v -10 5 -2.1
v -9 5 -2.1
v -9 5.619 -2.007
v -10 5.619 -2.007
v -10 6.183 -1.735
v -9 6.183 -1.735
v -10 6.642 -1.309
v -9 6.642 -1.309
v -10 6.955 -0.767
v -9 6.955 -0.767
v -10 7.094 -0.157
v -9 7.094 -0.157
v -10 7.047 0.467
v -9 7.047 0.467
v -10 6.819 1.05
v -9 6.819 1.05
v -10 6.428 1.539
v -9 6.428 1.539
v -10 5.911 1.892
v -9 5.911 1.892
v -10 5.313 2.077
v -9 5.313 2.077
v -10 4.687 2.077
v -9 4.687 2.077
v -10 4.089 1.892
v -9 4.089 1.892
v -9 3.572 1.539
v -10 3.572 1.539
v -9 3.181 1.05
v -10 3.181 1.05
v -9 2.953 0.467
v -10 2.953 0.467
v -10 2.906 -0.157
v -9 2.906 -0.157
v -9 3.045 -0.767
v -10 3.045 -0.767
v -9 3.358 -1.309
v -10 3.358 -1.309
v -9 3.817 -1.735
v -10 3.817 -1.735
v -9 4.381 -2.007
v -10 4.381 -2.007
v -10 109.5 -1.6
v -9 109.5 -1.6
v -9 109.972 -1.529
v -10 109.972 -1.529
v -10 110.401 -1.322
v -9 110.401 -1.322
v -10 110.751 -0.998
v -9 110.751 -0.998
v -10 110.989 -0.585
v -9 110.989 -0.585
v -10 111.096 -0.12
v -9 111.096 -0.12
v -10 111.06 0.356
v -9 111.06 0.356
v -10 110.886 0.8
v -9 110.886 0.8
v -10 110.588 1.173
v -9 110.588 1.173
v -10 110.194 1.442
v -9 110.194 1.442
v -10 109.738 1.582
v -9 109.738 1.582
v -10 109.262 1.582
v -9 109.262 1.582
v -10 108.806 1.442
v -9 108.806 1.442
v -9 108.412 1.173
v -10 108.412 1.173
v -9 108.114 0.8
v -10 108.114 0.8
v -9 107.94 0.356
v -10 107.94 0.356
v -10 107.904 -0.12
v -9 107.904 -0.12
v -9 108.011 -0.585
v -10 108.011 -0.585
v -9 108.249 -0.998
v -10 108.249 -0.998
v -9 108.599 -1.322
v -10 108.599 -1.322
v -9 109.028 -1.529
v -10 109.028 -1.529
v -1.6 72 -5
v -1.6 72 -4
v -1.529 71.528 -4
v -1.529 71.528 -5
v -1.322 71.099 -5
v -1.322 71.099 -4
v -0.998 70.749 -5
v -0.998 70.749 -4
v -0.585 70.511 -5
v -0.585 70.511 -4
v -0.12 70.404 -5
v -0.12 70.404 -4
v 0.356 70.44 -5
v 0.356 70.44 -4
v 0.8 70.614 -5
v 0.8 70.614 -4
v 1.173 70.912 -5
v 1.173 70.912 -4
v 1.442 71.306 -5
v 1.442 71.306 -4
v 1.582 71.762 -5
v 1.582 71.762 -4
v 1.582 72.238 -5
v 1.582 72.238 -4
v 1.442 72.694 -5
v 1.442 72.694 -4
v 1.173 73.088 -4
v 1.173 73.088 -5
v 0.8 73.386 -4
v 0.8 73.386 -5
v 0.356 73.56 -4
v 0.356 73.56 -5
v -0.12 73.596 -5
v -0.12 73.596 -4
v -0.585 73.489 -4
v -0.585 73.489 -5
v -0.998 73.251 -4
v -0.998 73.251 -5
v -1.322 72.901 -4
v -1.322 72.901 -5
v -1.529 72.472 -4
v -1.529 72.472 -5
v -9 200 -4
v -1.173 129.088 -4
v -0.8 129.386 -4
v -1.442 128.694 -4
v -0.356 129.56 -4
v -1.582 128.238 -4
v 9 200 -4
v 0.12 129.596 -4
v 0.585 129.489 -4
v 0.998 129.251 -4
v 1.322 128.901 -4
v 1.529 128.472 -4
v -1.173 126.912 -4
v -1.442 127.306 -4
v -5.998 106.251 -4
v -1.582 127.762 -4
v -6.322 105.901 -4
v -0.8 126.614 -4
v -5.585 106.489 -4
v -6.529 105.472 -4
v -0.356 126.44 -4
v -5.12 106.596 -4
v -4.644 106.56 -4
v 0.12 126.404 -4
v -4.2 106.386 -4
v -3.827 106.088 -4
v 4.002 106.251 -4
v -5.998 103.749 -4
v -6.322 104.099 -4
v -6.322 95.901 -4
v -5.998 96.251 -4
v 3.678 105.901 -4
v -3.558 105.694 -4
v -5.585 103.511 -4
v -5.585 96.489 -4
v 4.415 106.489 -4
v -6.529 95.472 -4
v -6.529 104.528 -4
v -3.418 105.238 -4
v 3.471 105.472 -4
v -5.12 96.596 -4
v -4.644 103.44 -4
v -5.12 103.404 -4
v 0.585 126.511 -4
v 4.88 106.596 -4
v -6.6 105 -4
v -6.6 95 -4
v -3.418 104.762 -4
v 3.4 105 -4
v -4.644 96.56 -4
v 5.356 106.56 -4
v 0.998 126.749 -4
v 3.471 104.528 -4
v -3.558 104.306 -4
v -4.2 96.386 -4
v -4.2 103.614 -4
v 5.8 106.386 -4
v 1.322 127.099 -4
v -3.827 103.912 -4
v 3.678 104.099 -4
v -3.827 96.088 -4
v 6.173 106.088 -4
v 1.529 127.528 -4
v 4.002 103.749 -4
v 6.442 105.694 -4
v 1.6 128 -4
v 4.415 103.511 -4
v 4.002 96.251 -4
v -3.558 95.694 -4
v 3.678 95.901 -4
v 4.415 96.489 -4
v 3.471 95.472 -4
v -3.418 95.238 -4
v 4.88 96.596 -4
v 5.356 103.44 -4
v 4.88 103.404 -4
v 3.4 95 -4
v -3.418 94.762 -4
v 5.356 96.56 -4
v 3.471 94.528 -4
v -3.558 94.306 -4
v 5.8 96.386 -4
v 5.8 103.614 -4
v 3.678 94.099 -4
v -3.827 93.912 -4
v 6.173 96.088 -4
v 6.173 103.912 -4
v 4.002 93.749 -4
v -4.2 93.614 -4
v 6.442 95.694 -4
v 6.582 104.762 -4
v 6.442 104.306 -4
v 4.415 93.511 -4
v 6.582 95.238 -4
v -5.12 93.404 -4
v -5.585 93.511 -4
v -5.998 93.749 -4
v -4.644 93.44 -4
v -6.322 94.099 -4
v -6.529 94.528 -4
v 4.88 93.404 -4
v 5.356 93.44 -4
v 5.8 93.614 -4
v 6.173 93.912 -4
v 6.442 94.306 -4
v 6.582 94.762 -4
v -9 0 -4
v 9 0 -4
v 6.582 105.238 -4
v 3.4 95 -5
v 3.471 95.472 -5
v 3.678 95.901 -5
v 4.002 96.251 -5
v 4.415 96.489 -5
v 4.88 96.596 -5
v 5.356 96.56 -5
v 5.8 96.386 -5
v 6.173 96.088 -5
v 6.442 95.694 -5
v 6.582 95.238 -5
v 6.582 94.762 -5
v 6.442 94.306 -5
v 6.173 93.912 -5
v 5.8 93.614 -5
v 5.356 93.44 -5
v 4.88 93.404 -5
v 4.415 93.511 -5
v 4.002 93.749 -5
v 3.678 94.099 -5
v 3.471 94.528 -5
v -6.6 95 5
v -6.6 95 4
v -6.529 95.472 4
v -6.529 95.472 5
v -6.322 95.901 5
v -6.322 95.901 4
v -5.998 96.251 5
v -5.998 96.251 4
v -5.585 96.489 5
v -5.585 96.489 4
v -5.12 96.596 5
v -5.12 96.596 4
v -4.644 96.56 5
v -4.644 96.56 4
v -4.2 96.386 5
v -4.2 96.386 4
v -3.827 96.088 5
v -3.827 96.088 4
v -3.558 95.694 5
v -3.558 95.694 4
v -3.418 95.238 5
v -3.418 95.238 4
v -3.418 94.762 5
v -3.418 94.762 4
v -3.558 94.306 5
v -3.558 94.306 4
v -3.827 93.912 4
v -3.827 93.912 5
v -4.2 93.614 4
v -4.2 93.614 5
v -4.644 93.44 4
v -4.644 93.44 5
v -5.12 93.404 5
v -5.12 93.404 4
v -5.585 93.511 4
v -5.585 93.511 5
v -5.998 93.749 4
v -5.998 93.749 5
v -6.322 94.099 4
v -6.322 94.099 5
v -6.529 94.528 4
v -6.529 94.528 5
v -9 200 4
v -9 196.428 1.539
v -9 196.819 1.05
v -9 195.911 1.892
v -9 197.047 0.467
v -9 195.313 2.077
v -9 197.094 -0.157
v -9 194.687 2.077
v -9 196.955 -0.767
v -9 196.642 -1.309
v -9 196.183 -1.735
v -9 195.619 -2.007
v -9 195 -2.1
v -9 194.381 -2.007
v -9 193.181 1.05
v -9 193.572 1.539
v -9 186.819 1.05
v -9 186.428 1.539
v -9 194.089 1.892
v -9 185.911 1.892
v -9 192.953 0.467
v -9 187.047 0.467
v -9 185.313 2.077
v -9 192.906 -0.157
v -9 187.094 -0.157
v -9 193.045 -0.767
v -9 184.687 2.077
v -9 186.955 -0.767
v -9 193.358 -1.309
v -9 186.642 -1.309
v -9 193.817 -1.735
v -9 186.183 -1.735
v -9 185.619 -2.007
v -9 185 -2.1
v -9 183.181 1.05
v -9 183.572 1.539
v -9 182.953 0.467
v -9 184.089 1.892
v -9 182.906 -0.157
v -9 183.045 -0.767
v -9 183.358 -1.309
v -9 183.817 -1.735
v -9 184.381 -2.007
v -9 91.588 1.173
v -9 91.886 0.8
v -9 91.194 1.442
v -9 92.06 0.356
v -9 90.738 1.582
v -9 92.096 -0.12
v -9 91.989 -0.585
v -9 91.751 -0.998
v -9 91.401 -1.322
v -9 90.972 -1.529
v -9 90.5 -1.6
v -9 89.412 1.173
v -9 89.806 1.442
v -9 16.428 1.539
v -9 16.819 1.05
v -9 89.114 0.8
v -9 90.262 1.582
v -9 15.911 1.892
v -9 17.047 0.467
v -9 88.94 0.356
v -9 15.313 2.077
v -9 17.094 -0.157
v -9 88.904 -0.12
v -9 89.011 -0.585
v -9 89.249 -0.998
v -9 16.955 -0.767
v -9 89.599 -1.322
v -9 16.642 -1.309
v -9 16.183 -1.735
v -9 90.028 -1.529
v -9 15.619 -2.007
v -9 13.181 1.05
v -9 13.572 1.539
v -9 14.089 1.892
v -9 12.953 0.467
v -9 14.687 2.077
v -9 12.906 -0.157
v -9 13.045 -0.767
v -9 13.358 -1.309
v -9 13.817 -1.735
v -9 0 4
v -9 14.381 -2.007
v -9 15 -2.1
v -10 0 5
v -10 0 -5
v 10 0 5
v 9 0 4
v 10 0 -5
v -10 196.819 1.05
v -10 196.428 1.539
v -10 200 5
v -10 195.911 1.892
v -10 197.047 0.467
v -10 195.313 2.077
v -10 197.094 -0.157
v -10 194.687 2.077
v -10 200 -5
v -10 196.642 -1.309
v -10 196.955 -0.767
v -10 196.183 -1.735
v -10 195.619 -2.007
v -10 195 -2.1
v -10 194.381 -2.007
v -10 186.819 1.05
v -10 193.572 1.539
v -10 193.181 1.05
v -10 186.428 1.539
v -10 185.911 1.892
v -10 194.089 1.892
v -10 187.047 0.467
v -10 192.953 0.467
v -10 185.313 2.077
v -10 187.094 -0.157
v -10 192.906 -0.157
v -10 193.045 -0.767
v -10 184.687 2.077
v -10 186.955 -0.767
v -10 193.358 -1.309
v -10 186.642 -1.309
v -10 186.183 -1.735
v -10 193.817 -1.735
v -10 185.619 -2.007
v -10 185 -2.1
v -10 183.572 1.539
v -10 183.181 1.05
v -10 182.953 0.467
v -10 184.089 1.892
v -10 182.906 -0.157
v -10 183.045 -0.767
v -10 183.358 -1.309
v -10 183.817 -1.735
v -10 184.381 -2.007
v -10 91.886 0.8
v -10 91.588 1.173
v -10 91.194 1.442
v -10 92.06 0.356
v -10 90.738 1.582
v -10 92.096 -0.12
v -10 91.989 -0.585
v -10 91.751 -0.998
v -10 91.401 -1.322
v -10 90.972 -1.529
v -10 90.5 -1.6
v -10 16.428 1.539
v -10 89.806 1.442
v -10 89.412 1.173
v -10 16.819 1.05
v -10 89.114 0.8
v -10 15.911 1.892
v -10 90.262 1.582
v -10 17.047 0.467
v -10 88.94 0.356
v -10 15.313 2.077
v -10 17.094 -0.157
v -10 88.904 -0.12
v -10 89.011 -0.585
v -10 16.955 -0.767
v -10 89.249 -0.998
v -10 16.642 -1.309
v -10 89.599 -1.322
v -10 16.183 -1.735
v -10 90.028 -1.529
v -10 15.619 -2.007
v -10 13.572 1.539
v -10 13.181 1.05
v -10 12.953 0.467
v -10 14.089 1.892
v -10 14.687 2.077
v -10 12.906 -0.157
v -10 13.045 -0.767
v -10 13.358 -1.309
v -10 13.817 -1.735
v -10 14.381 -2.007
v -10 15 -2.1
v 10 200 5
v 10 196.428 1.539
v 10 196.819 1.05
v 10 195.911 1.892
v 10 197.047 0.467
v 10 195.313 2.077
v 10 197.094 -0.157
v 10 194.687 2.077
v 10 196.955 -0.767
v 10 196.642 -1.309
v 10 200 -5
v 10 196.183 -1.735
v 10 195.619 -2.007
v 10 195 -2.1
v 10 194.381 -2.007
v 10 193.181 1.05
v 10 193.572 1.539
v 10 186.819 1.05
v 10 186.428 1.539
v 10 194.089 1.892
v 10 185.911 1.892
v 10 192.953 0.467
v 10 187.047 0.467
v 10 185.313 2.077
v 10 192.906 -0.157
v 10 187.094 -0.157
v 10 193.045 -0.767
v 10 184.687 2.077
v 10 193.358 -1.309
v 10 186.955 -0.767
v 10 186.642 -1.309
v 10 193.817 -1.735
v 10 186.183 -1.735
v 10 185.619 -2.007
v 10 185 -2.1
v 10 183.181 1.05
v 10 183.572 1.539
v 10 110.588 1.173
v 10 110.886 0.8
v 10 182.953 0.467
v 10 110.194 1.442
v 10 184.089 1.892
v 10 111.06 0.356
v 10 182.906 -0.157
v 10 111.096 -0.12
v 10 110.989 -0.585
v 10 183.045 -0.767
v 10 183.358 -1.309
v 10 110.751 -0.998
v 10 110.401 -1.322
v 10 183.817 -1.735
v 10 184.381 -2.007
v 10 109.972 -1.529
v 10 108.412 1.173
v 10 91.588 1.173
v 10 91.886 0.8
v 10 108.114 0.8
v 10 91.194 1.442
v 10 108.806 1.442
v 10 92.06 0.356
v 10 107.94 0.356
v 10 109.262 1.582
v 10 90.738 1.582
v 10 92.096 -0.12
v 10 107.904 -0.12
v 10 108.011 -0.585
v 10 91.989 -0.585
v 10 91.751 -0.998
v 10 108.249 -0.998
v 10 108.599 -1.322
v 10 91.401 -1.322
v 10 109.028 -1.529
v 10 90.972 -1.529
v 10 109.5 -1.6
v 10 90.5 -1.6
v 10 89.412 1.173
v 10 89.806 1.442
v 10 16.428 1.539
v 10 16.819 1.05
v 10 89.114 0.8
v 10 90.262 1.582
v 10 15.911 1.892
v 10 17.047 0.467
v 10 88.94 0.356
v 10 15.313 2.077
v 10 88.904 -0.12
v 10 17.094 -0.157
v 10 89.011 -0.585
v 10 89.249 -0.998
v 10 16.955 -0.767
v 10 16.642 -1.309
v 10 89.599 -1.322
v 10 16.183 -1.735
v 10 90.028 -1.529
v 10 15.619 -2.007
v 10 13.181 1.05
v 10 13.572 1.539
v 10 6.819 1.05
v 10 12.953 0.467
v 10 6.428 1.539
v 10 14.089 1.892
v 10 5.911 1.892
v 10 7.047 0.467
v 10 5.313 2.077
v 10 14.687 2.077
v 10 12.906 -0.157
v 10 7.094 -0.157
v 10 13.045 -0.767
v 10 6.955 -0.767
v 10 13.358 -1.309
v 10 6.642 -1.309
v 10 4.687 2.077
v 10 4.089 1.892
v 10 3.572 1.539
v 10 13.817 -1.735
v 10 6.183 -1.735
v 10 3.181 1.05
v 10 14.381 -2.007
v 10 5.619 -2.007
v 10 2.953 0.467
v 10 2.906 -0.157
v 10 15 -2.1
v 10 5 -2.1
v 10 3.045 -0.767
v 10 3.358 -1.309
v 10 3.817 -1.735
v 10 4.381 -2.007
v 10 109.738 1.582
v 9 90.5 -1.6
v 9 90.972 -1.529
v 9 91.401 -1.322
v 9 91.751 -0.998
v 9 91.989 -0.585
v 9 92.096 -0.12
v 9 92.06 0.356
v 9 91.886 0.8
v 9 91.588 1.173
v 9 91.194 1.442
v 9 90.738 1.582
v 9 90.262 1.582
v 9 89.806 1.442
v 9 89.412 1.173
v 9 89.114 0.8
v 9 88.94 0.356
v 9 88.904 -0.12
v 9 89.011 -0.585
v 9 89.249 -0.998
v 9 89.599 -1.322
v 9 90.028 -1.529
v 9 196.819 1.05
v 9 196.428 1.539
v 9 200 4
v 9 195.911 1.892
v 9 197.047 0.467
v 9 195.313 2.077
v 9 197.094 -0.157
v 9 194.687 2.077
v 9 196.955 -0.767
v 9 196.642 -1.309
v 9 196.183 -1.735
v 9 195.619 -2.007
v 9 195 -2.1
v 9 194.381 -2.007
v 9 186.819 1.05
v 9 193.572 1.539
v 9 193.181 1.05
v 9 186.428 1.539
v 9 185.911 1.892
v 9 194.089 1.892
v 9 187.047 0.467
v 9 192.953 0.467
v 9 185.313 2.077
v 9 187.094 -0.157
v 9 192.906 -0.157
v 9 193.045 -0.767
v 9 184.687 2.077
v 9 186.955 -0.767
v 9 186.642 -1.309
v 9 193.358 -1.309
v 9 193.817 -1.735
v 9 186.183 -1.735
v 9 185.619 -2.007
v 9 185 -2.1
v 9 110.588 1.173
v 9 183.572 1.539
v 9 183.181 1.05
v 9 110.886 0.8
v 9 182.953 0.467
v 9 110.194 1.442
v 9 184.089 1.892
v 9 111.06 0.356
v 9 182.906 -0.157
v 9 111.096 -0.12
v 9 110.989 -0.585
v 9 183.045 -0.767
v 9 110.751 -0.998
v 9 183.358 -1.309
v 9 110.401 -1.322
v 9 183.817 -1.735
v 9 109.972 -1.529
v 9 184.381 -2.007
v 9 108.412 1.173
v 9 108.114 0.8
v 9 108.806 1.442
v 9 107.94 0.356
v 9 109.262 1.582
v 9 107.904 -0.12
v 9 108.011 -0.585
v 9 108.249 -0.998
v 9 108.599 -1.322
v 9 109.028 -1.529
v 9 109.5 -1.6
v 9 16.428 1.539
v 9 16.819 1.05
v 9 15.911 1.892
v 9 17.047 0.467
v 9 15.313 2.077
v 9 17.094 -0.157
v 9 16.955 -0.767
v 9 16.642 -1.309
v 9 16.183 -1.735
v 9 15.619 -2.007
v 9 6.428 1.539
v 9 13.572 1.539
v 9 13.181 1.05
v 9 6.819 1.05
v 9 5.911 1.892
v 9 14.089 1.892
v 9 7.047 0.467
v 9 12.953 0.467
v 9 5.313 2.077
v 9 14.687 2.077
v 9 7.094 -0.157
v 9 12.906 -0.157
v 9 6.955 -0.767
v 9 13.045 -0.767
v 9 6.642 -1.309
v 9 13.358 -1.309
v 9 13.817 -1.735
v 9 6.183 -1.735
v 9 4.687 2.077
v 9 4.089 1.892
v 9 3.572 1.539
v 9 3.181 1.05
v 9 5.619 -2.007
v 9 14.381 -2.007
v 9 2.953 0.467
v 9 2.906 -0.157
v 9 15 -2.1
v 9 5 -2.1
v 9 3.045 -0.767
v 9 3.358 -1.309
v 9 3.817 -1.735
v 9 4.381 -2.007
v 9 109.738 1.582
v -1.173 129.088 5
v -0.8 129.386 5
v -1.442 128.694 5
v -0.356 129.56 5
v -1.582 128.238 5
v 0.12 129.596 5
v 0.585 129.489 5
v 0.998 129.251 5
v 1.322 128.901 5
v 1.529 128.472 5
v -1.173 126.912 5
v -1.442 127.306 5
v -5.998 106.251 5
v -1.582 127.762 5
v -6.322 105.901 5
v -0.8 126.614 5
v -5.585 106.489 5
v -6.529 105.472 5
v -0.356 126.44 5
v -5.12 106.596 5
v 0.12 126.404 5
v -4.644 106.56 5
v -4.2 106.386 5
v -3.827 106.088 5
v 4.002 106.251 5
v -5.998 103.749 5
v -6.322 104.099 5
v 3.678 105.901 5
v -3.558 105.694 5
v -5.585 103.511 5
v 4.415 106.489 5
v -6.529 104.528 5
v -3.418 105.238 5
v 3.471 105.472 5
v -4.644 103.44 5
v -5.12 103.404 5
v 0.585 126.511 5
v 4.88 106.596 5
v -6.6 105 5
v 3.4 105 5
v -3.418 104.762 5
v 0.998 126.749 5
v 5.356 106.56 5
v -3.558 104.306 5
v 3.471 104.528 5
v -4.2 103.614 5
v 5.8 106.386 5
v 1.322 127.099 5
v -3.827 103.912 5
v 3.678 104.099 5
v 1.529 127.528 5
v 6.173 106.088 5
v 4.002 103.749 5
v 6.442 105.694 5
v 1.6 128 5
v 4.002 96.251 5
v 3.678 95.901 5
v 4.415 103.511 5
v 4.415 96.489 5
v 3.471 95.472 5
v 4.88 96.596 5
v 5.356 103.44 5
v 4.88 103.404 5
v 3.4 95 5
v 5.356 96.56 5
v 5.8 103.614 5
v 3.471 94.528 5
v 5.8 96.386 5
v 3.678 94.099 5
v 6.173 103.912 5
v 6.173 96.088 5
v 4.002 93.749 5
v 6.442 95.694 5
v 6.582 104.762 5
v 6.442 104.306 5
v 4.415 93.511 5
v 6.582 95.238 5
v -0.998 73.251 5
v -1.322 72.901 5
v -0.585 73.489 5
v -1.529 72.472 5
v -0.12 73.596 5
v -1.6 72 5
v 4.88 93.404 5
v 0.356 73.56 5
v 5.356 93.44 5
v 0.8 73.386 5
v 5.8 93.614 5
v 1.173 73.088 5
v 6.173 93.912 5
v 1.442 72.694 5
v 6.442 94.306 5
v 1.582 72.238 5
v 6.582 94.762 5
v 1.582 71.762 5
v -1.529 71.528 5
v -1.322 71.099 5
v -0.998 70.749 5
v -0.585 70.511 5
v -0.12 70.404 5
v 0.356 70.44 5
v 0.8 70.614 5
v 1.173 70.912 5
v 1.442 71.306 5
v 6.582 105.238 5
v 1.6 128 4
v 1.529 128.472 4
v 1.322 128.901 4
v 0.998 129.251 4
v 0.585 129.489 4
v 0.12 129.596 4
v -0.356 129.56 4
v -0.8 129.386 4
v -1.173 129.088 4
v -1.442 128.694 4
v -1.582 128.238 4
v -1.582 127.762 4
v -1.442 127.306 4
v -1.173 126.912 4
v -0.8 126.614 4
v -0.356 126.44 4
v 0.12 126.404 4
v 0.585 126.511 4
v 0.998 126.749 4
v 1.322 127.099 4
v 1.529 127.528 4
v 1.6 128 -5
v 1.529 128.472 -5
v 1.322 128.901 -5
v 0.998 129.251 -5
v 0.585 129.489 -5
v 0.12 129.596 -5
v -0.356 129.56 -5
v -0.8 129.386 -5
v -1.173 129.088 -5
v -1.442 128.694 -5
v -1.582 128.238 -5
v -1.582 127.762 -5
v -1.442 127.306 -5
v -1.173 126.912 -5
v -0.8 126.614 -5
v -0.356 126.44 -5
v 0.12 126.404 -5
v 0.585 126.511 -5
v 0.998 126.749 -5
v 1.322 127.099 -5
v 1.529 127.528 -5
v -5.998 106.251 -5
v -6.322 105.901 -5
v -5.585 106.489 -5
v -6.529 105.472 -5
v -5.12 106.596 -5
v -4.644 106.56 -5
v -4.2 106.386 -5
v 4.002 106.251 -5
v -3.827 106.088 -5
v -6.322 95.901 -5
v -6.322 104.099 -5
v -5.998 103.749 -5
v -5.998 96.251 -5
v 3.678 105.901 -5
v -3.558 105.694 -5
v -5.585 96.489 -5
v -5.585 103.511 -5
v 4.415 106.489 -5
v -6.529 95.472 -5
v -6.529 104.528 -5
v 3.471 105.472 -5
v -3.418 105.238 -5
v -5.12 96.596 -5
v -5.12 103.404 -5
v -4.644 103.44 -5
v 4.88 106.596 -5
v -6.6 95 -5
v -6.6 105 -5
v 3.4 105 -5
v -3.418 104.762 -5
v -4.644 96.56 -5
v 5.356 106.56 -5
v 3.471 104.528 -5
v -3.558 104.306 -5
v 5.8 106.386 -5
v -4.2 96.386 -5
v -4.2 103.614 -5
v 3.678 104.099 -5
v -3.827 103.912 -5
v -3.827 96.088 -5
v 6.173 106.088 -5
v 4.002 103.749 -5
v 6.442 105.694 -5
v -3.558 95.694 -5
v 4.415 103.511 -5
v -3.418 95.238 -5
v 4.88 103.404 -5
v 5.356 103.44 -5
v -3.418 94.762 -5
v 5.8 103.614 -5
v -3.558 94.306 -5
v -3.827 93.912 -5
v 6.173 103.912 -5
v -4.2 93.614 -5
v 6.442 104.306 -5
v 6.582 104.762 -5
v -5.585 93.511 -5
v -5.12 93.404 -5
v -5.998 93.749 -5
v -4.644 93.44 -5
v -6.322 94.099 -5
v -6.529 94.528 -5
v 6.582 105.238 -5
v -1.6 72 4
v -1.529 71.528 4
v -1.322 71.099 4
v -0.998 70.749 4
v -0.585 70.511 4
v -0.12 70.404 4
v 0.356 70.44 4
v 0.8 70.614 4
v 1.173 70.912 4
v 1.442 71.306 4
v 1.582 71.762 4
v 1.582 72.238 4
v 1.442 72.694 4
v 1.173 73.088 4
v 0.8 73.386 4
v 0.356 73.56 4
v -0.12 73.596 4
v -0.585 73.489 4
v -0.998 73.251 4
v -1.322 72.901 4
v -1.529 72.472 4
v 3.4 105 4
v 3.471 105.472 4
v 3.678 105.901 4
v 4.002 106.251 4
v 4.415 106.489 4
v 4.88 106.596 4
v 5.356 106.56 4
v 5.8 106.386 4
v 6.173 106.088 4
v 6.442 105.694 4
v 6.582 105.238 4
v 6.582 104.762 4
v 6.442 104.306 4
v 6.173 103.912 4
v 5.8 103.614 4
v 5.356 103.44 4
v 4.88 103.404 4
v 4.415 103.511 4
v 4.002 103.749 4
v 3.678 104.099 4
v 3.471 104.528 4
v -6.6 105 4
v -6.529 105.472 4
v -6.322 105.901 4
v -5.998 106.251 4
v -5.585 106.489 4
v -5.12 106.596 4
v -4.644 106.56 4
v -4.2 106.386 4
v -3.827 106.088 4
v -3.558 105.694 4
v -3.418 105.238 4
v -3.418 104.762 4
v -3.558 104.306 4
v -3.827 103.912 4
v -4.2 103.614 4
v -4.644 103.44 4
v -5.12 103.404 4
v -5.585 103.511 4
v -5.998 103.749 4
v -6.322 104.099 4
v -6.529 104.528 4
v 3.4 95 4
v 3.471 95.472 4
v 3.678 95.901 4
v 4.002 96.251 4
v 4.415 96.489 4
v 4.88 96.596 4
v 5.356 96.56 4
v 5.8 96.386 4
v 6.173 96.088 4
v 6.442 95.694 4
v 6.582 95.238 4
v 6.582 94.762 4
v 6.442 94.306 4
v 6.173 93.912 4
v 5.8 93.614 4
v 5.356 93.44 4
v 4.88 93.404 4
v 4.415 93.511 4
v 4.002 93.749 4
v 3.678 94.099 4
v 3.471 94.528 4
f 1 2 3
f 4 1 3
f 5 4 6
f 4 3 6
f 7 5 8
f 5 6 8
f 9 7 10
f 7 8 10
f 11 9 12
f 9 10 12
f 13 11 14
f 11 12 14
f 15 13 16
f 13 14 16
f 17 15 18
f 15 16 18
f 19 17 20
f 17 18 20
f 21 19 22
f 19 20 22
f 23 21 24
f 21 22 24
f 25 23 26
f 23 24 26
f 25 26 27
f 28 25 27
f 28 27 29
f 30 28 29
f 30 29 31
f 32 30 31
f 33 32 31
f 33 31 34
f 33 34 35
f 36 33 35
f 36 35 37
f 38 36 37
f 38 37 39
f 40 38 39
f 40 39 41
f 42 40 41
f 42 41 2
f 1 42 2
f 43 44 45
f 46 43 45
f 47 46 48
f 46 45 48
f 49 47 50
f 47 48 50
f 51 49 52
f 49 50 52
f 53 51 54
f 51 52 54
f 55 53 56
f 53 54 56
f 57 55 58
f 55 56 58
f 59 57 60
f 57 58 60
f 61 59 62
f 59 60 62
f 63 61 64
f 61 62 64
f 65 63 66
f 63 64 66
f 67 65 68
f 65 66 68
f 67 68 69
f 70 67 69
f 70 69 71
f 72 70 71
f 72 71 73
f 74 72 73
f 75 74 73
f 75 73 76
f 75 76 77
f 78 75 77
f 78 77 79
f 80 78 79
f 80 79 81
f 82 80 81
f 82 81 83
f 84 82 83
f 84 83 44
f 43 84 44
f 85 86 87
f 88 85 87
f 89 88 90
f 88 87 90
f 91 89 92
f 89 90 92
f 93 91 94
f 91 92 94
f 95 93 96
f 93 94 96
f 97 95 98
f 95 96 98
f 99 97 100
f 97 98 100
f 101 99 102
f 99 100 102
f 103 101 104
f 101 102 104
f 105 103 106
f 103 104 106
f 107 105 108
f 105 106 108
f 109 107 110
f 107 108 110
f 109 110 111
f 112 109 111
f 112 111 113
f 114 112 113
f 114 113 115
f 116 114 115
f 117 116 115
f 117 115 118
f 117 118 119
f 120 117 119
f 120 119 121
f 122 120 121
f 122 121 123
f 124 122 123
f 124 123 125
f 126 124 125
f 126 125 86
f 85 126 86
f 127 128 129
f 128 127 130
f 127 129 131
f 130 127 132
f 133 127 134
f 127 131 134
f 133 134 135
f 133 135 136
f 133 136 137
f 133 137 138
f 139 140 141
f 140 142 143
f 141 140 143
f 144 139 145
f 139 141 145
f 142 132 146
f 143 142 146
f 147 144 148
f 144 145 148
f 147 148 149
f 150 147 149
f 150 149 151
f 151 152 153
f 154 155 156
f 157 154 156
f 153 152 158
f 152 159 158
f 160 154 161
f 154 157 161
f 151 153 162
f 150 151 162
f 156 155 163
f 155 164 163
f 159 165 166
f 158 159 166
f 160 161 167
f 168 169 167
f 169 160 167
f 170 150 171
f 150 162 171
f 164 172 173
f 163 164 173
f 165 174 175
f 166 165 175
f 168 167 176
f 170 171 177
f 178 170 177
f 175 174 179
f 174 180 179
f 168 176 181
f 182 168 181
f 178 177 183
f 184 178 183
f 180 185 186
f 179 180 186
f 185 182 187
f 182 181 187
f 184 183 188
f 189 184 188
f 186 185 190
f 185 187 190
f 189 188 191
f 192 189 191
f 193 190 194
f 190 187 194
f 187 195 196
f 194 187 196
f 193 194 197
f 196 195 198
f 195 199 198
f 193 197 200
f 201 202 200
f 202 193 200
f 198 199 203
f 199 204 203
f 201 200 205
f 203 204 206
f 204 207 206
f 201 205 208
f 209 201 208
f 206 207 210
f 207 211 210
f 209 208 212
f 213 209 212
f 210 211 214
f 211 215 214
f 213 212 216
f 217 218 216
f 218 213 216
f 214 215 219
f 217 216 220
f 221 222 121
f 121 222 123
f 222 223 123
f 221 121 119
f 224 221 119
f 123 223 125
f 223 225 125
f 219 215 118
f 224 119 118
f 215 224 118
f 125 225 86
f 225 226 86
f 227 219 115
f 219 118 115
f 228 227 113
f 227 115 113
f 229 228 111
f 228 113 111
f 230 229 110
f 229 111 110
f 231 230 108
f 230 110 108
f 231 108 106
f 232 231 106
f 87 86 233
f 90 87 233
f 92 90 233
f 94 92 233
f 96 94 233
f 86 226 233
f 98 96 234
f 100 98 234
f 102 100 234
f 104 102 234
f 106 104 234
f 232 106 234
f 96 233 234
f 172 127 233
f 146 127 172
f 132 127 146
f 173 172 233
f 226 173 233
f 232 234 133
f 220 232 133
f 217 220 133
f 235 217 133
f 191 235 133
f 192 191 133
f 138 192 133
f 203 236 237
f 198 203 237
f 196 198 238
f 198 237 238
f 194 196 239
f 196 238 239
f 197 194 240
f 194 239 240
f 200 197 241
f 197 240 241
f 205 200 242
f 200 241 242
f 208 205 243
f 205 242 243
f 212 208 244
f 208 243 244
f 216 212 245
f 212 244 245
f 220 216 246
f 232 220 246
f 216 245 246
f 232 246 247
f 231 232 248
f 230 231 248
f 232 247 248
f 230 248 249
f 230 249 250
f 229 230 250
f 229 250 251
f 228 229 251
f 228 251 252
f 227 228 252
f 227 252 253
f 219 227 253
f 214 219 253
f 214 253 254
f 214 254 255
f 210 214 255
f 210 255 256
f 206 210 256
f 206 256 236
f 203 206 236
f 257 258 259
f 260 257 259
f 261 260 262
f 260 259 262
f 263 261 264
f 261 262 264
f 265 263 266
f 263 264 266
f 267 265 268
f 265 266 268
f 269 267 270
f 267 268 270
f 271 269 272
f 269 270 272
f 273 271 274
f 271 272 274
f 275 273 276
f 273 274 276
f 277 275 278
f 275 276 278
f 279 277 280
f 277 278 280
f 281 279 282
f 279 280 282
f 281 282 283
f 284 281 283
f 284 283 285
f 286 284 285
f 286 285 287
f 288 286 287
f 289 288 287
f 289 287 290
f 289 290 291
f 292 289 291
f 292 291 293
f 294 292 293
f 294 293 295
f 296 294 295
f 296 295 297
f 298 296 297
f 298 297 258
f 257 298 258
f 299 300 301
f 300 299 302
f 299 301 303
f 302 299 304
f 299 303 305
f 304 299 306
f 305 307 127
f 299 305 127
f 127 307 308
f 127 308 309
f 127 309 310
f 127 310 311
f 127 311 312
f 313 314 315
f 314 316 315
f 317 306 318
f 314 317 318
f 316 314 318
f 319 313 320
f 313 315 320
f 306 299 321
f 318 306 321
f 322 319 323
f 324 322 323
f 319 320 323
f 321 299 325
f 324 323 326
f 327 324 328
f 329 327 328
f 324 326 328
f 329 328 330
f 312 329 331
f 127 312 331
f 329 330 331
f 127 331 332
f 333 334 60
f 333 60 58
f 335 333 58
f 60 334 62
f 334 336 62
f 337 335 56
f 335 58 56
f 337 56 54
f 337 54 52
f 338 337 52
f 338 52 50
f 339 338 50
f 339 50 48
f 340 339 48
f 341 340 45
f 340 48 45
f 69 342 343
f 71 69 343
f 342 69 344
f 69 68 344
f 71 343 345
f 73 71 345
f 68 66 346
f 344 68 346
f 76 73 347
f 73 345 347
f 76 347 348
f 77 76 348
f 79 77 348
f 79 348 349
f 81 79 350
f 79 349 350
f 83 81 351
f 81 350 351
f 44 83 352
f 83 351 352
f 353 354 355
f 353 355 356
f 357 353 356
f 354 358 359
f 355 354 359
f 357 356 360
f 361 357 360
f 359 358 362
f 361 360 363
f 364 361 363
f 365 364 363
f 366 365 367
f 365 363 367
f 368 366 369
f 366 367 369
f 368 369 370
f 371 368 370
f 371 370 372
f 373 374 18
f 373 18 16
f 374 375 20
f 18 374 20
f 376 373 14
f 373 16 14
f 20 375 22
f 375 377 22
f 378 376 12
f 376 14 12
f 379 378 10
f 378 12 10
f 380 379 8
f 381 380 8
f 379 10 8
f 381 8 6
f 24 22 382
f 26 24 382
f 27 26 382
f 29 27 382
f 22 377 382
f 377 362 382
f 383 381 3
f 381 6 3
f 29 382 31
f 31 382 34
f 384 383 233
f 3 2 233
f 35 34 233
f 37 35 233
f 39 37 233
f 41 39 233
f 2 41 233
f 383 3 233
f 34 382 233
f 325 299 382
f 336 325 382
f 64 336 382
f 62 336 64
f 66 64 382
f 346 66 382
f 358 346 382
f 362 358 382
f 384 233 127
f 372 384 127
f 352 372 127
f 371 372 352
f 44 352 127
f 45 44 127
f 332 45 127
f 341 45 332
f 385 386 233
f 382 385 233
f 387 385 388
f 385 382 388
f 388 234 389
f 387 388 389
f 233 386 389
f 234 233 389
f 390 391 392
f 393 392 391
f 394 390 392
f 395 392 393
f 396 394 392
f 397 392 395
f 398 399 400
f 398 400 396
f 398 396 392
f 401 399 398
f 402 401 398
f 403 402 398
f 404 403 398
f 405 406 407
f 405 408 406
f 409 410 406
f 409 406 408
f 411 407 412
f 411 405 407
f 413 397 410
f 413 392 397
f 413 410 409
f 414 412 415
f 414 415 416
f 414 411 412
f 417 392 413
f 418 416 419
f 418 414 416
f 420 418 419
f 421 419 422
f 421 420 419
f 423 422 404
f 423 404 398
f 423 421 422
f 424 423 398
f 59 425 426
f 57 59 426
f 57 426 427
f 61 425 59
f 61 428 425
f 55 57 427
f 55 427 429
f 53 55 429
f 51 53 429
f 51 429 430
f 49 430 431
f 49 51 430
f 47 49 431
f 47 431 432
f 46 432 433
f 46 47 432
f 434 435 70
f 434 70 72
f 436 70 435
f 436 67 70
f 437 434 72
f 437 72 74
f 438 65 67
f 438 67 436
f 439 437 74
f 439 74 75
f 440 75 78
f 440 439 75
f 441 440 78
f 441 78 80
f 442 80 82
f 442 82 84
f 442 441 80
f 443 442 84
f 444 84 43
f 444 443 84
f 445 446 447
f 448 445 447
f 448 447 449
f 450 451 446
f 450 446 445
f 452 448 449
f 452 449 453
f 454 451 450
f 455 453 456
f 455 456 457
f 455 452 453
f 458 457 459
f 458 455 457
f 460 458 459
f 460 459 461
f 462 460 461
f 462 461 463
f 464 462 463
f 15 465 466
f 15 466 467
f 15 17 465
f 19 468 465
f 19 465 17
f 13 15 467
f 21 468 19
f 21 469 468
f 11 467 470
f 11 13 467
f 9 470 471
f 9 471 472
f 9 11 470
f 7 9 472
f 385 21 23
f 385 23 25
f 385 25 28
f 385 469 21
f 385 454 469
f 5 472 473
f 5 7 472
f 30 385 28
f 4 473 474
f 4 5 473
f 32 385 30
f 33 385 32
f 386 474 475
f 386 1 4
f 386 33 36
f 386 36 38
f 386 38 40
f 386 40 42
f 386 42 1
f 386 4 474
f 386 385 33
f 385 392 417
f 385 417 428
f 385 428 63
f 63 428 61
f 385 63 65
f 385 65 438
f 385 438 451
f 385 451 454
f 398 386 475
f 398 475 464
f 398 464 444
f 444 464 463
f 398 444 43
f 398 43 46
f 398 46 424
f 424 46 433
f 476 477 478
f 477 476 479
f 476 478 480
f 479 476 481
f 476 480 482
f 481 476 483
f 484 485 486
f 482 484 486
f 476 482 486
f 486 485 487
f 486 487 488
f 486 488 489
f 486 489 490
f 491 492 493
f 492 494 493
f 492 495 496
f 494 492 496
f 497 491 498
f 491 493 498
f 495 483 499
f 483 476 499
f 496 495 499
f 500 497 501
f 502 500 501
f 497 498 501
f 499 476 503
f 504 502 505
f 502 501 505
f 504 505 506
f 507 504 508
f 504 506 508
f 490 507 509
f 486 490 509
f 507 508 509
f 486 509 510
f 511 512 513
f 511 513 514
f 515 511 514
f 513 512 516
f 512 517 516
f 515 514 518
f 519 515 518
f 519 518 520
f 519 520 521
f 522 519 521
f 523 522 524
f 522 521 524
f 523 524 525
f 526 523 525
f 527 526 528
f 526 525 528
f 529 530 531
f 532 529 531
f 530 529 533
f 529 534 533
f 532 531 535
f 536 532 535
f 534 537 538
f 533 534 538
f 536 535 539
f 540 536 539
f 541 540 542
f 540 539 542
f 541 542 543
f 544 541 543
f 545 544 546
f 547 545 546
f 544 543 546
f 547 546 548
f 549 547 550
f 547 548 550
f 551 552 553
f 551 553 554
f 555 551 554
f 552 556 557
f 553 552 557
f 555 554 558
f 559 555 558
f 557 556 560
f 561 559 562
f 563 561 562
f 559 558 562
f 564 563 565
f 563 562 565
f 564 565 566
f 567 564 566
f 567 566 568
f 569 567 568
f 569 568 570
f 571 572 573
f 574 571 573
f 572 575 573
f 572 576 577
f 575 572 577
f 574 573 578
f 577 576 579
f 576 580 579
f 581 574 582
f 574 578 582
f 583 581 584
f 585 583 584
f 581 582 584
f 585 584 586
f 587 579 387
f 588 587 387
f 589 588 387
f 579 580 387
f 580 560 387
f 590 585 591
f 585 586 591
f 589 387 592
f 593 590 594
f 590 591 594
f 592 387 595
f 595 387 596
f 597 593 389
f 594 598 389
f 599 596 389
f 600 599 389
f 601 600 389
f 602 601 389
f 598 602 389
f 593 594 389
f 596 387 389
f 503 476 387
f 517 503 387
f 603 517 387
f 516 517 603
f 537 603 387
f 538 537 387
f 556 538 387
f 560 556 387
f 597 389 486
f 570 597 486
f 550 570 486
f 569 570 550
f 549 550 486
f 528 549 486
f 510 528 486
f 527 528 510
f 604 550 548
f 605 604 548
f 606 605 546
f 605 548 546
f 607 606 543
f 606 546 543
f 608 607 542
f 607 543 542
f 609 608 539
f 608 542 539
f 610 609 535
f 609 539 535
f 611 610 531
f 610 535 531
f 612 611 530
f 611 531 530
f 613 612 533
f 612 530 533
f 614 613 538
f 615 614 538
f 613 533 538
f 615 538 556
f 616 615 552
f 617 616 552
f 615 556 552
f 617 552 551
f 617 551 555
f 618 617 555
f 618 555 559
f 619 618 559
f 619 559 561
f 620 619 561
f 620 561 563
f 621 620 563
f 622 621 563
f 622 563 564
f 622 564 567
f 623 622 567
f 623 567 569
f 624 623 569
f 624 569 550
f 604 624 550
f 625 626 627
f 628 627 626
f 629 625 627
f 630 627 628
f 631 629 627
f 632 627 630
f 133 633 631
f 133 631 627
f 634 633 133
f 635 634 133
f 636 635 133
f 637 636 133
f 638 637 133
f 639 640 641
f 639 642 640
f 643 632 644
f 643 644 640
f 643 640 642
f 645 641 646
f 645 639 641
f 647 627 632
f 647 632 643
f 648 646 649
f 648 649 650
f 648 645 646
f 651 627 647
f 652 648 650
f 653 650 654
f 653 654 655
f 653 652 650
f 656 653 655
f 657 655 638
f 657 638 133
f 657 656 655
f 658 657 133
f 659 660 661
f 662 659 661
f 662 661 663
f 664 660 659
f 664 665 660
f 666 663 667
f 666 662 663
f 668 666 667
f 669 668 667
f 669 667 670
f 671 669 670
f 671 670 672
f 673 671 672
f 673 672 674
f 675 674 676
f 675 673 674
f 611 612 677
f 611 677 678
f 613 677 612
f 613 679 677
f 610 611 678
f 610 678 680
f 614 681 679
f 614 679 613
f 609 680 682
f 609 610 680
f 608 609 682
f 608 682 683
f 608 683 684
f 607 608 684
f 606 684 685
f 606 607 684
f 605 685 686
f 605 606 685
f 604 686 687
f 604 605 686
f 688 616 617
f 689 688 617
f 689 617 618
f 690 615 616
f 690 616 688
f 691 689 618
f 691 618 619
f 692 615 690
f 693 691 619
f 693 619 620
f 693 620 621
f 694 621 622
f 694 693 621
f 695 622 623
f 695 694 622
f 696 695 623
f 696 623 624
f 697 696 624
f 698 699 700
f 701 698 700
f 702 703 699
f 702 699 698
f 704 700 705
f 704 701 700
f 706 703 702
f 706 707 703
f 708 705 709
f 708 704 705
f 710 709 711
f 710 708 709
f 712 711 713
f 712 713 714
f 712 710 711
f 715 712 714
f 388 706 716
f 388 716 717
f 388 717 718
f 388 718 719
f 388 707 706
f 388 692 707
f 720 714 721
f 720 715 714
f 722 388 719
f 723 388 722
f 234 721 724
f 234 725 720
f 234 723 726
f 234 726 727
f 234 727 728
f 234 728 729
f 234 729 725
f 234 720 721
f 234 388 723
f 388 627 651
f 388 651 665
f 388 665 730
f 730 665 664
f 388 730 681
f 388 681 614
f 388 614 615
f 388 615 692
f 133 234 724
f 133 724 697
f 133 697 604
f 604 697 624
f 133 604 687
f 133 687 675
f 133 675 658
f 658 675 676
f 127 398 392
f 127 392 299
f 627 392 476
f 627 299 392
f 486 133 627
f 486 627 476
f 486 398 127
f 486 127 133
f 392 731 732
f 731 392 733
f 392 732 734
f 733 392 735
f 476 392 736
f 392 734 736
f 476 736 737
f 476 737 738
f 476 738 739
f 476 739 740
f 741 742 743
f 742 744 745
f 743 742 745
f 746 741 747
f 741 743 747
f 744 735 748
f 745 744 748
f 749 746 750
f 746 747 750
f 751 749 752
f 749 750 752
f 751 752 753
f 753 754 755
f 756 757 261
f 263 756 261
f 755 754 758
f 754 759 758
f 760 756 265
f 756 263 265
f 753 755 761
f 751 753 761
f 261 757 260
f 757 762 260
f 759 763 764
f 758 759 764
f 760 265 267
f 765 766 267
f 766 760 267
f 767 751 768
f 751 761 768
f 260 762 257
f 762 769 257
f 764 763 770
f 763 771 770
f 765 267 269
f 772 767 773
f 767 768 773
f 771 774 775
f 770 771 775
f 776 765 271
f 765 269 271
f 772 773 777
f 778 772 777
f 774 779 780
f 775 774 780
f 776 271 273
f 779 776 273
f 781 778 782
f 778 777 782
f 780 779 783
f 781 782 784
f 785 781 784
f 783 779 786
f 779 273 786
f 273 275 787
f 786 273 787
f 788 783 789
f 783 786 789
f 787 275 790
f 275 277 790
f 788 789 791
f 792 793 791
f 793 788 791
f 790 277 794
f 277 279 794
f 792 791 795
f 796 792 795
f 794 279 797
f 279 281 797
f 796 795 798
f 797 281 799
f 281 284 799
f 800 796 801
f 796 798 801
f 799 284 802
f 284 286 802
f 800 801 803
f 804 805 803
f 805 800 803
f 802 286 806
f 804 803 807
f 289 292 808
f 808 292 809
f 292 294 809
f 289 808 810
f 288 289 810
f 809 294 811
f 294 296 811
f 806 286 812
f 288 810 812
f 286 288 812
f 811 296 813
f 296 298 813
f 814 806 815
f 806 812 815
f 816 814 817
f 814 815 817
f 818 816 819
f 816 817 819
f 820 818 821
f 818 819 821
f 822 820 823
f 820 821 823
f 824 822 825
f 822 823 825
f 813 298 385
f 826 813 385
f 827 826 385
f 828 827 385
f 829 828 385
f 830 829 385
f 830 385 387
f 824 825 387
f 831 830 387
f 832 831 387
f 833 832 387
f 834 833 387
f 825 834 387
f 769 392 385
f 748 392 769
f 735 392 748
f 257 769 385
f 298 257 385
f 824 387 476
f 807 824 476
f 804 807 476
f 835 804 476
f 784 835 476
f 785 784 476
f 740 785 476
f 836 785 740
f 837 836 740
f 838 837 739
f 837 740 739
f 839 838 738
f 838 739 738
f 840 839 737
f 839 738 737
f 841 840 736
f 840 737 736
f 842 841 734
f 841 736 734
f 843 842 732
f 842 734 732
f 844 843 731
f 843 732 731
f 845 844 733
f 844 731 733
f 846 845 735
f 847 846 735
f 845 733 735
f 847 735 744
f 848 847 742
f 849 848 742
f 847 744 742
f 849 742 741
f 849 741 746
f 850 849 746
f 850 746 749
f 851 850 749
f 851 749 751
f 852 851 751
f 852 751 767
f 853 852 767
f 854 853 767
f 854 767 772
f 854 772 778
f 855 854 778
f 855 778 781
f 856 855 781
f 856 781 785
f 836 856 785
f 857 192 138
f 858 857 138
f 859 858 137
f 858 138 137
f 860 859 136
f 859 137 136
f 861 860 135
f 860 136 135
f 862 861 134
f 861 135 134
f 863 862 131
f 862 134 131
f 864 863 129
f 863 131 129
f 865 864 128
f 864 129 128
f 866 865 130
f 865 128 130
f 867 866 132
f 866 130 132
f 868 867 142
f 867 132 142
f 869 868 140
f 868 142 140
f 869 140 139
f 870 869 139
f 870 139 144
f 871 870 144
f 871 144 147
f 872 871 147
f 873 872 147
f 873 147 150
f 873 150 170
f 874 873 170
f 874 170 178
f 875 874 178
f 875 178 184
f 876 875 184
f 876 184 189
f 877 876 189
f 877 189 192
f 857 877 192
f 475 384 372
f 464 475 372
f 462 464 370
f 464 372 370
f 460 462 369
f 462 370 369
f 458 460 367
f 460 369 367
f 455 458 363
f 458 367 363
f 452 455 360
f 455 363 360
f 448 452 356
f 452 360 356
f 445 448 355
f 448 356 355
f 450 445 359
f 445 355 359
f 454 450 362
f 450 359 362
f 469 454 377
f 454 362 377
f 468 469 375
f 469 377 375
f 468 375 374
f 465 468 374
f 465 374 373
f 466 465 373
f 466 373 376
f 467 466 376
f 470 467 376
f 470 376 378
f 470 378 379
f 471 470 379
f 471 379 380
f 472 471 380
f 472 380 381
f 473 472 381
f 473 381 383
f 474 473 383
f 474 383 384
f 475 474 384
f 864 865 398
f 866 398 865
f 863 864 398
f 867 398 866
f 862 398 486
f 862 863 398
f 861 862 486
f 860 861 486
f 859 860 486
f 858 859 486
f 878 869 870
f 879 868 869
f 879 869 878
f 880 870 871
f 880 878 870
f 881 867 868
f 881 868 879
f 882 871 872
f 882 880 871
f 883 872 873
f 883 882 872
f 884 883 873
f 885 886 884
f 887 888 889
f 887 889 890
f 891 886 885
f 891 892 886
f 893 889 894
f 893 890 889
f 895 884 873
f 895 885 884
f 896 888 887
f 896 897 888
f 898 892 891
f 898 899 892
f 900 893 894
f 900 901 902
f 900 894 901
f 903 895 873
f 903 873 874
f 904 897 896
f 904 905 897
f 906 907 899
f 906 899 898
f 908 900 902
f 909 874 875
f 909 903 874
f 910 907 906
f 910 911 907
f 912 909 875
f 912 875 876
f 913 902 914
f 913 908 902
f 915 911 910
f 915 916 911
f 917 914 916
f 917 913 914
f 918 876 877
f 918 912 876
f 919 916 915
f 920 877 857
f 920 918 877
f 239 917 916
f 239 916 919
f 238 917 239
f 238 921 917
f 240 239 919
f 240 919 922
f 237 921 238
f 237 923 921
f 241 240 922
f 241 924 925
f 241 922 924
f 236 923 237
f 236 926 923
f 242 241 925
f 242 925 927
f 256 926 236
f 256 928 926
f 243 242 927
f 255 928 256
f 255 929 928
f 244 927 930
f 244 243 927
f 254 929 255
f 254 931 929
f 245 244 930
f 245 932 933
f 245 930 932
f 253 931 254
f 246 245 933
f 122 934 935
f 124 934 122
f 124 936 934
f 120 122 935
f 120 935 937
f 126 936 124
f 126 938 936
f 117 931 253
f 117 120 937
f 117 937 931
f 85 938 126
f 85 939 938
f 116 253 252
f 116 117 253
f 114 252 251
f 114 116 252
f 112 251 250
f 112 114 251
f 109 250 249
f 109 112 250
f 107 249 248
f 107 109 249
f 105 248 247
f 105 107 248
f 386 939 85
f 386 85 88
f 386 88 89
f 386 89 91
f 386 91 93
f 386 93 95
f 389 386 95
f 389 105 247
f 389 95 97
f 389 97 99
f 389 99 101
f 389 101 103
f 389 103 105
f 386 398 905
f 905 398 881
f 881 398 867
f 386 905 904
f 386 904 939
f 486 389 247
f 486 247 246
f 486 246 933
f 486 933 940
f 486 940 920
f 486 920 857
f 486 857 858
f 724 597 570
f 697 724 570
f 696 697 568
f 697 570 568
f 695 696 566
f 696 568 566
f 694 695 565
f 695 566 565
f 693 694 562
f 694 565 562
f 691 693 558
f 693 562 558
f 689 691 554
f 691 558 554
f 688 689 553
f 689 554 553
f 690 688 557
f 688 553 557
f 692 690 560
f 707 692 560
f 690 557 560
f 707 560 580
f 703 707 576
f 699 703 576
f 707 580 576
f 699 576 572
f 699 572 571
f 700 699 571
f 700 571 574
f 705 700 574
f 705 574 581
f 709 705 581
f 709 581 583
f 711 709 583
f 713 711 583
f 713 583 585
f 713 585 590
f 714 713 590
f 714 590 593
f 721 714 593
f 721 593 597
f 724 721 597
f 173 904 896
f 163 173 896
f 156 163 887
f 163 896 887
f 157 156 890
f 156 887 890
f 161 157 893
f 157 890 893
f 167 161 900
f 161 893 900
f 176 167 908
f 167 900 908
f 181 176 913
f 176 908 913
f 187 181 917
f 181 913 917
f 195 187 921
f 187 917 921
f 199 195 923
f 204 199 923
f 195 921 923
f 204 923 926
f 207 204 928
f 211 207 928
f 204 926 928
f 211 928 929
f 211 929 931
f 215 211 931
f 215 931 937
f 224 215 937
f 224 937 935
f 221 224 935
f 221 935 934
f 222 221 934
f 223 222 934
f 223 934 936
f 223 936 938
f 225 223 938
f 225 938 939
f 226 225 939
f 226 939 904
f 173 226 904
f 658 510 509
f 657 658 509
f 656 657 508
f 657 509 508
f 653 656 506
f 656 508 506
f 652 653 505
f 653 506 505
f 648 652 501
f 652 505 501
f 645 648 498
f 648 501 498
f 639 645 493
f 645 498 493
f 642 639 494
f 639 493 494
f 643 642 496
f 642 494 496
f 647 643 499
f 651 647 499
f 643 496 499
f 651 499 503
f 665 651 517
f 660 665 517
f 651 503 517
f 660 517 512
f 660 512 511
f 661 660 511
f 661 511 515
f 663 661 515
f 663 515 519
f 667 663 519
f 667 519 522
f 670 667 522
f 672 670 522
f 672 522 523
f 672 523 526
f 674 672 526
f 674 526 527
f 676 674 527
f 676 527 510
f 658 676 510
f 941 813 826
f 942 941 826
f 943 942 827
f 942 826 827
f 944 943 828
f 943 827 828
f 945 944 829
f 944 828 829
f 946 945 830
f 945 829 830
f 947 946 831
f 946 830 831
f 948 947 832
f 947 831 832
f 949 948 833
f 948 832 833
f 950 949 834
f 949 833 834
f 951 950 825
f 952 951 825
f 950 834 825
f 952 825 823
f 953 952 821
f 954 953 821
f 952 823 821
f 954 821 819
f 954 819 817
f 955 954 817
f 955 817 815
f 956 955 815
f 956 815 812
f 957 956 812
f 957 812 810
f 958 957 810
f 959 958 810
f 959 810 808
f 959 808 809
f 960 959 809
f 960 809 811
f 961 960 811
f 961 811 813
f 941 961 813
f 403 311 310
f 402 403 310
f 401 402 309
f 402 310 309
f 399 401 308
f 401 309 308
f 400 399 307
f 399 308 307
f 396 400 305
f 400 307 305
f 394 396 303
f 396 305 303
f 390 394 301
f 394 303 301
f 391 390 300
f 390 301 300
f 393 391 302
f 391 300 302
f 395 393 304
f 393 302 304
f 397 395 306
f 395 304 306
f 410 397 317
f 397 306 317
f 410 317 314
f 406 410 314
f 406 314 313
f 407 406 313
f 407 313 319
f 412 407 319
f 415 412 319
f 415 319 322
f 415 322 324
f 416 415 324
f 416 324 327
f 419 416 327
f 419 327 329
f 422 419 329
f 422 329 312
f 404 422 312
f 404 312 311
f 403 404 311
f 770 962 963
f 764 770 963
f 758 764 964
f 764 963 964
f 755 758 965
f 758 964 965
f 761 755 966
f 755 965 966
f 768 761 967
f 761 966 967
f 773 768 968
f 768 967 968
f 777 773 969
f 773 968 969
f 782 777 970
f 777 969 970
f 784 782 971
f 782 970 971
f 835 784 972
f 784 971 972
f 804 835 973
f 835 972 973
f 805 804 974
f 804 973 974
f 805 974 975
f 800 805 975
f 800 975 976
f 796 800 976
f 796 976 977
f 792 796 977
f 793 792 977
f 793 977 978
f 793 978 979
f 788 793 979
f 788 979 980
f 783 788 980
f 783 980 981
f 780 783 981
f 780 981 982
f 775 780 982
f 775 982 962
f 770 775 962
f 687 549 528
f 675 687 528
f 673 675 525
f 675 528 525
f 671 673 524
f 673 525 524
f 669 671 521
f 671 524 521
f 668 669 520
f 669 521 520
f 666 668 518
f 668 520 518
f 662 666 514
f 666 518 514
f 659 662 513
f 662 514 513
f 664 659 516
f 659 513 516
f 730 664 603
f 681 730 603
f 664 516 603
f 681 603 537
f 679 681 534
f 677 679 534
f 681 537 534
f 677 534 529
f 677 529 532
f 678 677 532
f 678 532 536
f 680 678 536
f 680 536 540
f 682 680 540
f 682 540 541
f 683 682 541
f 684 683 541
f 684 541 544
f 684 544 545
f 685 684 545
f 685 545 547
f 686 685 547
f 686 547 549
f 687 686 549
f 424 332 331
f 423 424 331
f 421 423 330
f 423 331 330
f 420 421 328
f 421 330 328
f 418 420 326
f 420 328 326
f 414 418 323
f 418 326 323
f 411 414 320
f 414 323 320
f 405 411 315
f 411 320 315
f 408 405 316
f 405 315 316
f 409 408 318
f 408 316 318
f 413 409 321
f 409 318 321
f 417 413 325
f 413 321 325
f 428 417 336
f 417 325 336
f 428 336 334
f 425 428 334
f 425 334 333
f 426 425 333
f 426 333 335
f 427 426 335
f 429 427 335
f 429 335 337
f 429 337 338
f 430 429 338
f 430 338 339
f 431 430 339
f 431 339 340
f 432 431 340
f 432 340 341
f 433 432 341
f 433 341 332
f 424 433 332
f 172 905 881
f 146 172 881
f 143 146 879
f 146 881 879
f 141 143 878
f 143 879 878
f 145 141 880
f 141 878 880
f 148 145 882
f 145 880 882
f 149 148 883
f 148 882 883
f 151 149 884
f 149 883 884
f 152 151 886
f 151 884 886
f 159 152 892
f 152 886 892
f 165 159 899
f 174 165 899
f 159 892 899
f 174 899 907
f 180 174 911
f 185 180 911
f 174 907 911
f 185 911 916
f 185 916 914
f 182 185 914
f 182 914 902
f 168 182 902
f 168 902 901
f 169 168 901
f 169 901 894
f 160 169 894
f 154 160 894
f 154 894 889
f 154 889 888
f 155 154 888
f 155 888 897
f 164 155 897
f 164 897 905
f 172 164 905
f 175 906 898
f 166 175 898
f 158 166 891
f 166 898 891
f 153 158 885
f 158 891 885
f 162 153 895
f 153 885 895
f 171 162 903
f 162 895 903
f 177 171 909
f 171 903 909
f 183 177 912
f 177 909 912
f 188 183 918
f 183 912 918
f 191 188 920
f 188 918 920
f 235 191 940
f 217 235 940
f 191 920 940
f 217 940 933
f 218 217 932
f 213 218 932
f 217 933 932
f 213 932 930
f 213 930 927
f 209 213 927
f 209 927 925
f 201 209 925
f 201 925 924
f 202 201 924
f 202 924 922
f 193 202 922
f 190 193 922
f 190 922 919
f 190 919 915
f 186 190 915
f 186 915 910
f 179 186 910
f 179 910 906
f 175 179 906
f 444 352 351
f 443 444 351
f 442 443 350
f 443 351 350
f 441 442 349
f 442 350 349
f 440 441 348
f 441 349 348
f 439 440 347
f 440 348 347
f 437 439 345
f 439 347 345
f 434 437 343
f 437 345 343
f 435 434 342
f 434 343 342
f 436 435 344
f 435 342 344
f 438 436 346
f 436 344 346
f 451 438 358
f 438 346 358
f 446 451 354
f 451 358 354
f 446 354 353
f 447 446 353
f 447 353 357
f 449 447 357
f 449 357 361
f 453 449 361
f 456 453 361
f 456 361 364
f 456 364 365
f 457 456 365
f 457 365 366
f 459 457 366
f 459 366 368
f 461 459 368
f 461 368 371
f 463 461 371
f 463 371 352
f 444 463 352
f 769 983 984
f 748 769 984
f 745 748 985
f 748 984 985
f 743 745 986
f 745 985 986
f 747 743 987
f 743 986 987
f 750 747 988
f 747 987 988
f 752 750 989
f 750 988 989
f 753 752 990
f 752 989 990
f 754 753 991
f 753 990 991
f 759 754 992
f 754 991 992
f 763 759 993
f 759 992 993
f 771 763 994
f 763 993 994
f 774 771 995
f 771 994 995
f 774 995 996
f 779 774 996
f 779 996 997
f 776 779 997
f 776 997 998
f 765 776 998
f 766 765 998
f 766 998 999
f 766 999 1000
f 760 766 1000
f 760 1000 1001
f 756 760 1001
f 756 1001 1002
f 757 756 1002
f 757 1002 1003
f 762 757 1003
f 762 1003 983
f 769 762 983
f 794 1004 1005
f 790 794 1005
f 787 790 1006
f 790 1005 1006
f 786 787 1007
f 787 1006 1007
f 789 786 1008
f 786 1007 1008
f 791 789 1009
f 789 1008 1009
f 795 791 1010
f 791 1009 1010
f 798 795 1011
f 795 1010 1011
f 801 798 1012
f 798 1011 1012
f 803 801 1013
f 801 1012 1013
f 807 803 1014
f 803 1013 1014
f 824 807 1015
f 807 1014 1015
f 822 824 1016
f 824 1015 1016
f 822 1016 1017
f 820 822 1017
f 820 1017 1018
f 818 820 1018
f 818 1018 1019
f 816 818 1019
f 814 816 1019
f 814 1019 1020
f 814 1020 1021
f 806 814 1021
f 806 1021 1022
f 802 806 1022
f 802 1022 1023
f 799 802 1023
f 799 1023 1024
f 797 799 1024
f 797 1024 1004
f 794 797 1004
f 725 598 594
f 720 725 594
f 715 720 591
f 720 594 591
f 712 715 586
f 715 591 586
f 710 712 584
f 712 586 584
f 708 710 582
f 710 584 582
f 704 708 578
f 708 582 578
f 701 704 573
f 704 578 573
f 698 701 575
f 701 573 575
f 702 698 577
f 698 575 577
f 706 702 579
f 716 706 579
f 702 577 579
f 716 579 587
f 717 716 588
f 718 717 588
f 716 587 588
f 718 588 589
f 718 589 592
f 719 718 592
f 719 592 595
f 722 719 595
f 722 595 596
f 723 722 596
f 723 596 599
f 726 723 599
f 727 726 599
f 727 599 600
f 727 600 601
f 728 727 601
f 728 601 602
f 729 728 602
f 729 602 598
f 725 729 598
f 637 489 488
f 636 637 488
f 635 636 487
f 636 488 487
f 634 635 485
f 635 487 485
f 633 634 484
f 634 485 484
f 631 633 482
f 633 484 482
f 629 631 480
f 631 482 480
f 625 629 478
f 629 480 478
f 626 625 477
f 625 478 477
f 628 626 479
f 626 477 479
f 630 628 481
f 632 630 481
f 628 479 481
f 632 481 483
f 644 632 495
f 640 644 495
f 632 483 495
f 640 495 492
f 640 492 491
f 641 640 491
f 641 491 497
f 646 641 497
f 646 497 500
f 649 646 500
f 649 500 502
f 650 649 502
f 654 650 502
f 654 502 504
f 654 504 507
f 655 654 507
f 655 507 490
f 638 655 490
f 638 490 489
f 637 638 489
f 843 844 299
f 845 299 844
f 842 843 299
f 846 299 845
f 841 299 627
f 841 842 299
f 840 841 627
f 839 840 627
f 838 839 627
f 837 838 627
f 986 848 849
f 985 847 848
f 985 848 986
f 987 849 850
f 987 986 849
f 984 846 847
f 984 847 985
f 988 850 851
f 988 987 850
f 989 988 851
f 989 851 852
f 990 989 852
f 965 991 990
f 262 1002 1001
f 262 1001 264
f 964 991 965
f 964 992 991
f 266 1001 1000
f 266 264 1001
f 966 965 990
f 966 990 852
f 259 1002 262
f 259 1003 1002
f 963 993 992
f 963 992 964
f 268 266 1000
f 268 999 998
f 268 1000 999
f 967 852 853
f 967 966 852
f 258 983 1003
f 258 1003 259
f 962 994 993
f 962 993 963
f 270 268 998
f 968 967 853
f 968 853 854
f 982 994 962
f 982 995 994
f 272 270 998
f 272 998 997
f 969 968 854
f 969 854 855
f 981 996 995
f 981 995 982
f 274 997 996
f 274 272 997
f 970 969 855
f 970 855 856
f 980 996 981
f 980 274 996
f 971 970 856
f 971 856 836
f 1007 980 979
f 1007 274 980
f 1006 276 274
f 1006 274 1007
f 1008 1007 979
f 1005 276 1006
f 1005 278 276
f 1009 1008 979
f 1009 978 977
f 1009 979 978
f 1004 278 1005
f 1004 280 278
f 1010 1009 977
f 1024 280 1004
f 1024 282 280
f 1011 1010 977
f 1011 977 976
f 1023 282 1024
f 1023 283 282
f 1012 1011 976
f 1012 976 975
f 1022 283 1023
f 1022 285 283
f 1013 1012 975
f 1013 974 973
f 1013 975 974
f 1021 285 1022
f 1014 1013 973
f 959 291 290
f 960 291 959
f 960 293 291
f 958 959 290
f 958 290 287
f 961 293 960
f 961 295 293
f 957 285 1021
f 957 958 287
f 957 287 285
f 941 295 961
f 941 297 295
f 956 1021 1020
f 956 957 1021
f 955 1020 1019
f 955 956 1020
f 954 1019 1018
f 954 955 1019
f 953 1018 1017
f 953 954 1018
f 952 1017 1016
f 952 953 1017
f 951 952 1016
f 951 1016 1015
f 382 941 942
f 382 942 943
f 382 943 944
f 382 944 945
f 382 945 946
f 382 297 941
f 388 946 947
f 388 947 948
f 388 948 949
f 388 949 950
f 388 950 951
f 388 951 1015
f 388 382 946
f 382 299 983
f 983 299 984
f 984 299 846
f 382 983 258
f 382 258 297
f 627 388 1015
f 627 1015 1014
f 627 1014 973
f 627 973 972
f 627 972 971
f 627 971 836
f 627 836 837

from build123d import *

# Parameters (mm, degrees)
SKETCH_1_W          = 20
SKETCH_1_H          = 10
SKETCH_1_W_2        = 18
SKETCH_1_H_2        = 8
EXTRUDE_1_DEPTH     = 200
SKETCH_3_R          = 1.6
CUT_EXTRUDE_1_DEPTH = 201.499376558
SKETCH_4_R          = 1.6
CUT_EXTRUDE_2_DEPTH = 202.059692629
SKETCH_5_R          = 1.6
CUT_EXTRUDE_3_DEPTH = 201.499376558
SKETCH_6_R          = 2.1
CUT_EXTRUDE_4_DEPTH = 202.059692629


with BuildPart() as part:
    # 草图1 → 拉伸-薄壁1 (new body)
    with BuildSketch(Plane(origin=(0, 0, 0), x_dir=(1, 0, 0), z_dir=(0, 1, 0))):
        Rectangle(SKETCH_1_W, SKETCH_1_H)
        Rectangle(SKETCH_1_W_2, SKETCH_1_H_2, mode=Mode.SUBTRACT)
    extrude(amount=EXTRUDE_1_DEPTH)

    # 草图3 → 切除-拉伸1 (cut, through all)
    with BuildSketch(Plane.XY.offset(5)):
        with Locations((0, 128)):
            Circle(SKETCH_3_R)
        with Locations(Location((0, 72, 0), (0, 0, 180))):
            Circle(SKETCH_3_R)
    extrude(amount=-CUT_EXTRUDE_1_DEPTH, mode=Mode.SUBTRACT)

    # 草图4 → 切除-拉伸2 (cut, through all)
    with BuildSketch(Plane(origin=(10, 0, 0), x_dir=(0, 0, -1), z_dir=(1, 0, 0))):
        with Locations((0, 109.5)):
            Circle(SKETCH_4_R)
        with Locations((0, 90.5)):
            Circle(SKETCH_4_R)
    extrude(amount=-CUT_EXTRUDE_2_DEPTH, mode=Mode.SUBTRACT)

    # 草图5 → 切除-拉伸3 (cut, through all)
    with BuildSketch(Plane(origin=(0, 0, -5), x_dir=(-1, 0, 0), z_dir=(0, 0, -1))):
        with Locations((-5, 105)):
            Circle(SKETCH_5_R)
        with Locations((-5, 95)):
            Circle(SKETCH_5_R)
        with Locations((5, 95)):
            Circle(SKETCH_5_R)
        with Locations((5, 105)):
            Circle(SKETCH_5_R)
    extrude(amount=-CUT_EXTRUDE_3_DEPTH, mode=Mode.SUBTRACT)

    # 草图6 → 切除-拉伸4 (cut, through all)
    with BuildSketch(Plane(origin=(10, 0, 0), x_dir=(0, 0, -1), z_dir=(1, 0, 0))):
        with Locations((0, 5)):
            Circle(SKETCH_6_R)
        with Locations((0, 15)):
            Circle(SKETCH_6_R)
        with Locations((0, 185)):
            Circle(SKETCH_6_R)
        with Locations((0, 195)):
            Circle(SKETCH_6_R)
    extrude(amount=-CUT_EXTRUDE_4_DEPTH, mode=Mode.SUBTRACT)


solid = part.part
